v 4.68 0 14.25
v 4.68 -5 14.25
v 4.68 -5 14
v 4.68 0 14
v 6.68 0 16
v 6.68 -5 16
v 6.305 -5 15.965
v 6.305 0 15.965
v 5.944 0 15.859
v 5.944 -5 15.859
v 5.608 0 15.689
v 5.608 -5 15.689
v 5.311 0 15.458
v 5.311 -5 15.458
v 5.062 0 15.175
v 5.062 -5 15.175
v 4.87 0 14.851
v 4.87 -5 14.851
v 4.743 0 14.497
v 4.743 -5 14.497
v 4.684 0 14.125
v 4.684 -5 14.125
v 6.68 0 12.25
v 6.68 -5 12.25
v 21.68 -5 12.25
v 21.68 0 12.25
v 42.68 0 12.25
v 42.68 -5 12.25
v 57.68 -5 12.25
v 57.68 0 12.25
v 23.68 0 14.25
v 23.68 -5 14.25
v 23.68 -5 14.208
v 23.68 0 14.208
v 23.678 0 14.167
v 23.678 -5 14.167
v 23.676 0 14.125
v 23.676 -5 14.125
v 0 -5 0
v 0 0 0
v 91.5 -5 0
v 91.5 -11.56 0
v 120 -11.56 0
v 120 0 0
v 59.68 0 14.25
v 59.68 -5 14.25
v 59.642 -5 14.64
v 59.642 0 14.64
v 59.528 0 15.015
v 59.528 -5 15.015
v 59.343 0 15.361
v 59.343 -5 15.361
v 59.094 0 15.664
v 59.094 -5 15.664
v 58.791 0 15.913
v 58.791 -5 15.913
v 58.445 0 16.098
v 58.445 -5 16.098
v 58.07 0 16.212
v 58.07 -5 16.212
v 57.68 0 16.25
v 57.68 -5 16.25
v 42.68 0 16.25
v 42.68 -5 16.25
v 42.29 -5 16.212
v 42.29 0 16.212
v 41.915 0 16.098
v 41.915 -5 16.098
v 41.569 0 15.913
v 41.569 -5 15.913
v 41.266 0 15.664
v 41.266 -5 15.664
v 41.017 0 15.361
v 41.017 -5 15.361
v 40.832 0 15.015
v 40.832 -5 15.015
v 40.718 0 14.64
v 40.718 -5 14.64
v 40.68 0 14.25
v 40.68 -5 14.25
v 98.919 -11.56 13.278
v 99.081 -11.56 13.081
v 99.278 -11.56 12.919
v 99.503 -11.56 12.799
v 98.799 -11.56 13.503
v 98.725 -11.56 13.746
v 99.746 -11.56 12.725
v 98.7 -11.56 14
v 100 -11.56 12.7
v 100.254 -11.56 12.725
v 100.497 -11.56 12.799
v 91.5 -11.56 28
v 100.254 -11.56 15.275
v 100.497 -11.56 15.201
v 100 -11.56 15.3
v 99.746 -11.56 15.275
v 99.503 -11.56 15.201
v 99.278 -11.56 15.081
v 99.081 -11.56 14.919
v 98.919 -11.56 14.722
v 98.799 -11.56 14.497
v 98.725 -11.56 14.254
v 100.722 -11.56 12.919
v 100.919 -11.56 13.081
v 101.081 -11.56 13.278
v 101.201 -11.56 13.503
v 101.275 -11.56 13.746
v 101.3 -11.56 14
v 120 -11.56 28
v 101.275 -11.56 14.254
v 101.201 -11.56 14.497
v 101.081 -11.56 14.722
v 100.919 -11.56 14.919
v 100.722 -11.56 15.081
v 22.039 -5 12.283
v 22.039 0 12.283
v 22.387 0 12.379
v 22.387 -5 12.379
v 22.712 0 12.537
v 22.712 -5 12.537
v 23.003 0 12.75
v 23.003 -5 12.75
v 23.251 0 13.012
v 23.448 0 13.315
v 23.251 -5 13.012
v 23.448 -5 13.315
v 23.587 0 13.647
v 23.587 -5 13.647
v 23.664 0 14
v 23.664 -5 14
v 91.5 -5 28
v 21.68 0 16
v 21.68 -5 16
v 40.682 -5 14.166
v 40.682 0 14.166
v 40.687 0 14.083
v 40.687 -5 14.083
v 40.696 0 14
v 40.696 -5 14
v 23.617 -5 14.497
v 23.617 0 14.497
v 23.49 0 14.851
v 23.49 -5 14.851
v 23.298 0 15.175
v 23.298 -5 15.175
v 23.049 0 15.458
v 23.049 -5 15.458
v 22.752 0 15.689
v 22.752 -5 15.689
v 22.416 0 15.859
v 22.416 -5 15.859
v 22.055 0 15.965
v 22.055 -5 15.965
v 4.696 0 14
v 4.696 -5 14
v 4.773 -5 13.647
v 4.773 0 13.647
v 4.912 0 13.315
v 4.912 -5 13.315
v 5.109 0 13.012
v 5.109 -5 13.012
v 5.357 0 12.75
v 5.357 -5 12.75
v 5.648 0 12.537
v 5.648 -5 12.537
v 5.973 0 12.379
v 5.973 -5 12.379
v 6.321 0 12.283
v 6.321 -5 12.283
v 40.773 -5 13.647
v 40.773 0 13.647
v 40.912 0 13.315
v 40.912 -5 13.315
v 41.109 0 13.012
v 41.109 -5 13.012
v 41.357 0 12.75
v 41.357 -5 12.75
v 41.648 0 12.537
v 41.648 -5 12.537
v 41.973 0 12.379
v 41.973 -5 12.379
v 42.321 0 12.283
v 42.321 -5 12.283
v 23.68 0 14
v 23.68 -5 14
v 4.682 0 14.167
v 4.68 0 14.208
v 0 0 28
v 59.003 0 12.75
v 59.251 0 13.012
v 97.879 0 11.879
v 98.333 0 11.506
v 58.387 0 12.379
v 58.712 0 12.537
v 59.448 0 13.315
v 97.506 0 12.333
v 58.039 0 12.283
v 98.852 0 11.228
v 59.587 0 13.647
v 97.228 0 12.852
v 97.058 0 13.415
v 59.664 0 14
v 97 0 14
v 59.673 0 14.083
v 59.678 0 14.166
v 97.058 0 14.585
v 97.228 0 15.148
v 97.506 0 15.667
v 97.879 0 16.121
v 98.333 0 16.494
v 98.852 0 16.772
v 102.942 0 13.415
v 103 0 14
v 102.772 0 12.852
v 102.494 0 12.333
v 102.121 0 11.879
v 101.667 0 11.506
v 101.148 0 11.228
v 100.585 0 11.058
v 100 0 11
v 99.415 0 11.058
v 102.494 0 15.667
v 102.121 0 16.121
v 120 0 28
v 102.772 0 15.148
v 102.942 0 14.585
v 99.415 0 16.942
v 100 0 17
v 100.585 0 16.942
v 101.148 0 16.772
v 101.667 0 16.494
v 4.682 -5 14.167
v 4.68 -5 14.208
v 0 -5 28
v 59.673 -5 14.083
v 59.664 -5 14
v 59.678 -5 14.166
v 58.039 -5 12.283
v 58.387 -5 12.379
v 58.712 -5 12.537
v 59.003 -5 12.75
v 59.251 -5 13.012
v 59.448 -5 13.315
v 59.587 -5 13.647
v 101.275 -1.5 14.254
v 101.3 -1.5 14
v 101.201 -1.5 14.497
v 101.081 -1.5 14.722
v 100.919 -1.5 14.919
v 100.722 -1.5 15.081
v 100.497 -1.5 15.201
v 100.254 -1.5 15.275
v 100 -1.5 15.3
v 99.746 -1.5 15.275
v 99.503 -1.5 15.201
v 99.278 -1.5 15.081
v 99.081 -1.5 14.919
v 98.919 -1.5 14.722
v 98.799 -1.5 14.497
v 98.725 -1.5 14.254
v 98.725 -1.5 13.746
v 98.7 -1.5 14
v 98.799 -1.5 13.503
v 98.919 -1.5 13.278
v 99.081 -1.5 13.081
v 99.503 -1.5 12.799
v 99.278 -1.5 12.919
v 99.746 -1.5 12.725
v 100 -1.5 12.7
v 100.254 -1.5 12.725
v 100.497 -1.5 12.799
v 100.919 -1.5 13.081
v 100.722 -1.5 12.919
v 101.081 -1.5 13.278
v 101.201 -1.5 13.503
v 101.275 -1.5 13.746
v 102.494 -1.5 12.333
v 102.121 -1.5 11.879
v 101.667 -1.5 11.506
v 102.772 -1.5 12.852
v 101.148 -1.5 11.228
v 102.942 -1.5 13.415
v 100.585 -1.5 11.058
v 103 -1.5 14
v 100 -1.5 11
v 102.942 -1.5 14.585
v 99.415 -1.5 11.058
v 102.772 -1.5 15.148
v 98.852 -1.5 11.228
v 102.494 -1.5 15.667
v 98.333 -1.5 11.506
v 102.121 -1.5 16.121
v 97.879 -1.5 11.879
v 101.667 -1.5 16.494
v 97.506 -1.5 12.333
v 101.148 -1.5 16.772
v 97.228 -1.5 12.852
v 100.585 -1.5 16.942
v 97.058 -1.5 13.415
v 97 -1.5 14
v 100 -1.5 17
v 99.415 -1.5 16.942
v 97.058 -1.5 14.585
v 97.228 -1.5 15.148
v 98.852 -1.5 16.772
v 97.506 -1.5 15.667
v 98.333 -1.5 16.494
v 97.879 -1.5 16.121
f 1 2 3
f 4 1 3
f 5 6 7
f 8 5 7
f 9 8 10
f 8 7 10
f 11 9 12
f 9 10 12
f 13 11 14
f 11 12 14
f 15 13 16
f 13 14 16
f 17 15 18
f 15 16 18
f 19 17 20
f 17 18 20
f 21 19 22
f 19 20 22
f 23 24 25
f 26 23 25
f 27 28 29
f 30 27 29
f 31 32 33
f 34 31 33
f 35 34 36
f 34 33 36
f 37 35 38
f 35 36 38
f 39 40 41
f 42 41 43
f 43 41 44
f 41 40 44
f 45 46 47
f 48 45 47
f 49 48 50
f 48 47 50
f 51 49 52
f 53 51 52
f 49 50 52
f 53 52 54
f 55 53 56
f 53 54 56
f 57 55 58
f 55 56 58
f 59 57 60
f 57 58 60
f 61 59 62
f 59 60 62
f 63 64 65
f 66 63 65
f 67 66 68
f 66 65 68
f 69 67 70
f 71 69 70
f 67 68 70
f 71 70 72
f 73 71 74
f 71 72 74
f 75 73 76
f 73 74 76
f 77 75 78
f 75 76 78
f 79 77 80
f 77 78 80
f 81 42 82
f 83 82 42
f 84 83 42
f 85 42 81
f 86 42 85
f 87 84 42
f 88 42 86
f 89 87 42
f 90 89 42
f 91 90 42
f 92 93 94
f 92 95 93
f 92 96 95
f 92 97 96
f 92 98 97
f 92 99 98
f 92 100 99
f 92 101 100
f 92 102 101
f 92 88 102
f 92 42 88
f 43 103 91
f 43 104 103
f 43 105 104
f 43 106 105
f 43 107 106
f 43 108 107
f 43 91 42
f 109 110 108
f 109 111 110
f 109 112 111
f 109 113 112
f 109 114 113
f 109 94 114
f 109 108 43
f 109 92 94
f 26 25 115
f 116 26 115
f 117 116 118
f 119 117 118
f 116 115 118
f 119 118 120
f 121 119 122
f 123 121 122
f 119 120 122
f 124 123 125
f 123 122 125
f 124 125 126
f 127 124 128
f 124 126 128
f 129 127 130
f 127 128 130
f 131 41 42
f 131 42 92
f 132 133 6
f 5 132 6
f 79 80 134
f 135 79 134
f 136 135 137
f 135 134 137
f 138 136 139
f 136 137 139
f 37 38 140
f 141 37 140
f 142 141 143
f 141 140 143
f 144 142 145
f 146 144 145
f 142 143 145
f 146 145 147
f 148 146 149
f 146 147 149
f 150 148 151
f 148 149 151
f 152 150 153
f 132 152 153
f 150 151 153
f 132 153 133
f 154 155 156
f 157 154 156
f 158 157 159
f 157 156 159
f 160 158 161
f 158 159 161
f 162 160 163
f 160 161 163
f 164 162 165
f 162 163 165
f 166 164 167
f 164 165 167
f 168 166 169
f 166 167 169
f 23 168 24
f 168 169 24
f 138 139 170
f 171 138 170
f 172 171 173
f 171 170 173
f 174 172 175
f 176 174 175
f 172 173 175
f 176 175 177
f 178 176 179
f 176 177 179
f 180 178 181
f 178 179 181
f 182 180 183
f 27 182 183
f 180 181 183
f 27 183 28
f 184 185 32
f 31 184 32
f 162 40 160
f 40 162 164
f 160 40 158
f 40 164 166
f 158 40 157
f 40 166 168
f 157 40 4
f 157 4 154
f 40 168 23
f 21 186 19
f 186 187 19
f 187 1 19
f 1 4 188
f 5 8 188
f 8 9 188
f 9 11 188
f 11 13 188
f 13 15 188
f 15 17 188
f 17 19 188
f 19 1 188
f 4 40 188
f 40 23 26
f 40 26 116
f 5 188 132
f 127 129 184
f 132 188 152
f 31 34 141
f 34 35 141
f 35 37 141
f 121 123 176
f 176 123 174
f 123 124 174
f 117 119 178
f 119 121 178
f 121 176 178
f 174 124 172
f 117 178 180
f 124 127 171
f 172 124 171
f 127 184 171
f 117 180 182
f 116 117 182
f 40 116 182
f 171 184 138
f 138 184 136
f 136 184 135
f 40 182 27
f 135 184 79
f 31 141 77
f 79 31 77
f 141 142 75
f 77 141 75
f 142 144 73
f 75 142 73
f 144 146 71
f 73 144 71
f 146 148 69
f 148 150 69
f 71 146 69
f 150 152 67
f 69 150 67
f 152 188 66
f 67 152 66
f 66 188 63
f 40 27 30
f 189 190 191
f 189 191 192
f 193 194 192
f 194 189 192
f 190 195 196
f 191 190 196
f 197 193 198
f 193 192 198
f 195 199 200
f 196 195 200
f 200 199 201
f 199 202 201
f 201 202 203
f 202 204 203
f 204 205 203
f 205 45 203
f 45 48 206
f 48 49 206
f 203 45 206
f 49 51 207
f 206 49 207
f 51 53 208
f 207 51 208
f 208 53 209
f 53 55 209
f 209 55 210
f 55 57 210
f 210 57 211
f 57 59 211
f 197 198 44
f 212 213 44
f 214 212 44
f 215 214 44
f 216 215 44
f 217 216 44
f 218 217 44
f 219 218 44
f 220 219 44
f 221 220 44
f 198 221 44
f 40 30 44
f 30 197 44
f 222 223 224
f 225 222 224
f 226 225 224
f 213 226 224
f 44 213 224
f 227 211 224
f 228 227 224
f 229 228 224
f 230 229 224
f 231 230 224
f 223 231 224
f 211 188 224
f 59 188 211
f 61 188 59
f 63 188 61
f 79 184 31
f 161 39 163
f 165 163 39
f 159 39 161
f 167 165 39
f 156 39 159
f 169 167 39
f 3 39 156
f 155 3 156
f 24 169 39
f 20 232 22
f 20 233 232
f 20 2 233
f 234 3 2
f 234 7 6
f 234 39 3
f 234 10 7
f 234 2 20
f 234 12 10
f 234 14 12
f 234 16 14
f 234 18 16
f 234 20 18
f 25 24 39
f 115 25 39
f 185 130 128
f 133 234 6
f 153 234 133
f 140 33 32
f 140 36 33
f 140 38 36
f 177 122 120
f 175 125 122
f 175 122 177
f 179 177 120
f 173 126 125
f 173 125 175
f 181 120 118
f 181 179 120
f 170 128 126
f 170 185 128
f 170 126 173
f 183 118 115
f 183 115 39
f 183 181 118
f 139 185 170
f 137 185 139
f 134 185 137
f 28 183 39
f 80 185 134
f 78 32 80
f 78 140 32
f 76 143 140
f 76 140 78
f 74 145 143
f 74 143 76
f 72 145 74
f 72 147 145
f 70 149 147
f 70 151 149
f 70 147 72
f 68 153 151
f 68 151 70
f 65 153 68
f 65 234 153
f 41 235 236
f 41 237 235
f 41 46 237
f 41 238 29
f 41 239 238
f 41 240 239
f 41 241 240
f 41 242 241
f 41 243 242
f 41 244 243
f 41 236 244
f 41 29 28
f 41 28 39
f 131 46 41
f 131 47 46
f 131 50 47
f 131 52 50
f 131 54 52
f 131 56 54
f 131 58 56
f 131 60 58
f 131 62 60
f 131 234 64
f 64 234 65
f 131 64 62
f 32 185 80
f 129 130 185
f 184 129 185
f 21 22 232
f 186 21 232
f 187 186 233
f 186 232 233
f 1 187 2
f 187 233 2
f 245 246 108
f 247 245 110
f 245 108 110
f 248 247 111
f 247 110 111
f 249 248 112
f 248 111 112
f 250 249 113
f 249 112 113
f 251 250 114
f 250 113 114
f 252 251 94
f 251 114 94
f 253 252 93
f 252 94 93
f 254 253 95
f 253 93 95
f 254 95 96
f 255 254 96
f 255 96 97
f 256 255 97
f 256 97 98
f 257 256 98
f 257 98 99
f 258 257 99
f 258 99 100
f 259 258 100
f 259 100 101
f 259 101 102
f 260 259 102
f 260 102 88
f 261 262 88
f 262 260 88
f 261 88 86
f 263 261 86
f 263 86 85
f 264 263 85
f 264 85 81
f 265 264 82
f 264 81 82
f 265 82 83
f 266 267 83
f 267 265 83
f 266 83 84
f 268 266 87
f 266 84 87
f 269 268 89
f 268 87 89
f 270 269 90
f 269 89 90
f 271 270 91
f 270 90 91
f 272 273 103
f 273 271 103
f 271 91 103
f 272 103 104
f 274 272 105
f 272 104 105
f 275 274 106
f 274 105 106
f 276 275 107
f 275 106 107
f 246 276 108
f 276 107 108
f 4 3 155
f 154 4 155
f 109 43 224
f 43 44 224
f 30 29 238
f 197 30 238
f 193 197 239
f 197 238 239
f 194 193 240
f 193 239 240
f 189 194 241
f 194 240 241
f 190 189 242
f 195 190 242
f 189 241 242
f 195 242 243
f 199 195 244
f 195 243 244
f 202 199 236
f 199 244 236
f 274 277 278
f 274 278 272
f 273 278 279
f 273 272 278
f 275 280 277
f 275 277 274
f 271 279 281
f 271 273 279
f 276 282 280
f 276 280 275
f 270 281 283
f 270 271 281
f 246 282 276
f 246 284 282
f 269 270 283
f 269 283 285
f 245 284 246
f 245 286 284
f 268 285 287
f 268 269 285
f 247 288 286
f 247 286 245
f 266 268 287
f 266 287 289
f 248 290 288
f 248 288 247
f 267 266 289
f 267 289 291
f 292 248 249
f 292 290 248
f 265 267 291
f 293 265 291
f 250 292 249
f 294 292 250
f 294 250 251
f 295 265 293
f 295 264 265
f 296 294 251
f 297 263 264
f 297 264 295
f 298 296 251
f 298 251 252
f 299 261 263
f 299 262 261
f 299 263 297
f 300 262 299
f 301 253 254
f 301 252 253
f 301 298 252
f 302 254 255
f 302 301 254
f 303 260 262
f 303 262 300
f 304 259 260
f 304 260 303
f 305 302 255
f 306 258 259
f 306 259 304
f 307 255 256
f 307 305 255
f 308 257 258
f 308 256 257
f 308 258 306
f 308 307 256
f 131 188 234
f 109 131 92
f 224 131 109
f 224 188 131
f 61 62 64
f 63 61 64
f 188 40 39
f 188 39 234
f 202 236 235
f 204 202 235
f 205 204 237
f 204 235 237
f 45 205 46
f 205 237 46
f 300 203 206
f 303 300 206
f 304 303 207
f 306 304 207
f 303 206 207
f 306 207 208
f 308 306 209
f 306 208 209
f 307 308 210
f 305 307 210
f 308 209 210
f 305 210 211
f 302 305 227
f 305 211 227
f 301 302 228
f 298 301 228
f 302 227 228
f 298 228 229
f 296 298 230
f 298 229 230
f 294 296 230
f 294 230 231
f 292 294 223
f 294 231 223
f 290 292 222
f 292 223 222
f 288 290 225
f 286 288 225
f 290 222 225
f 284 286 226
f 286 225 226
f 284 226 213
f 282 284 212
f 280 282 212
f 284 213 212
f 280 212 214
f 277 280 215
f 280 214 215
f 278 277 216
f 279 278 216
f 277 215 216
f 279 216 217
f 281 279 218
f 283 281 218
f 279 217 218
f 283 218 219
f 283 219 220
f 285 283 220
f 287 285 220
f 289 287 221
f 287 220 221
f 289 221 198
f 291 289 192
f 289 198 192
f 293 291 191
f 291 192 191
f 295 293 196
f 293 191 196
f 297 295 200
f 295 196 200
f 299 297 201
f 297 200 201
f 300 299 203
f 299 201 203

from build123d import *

# Parameters (mm, degrees)
F0_W     = 120
F0_H     = 28
F1_DEPTH = 5
F2_W     = 28.5
F2_H     = 28
F3_DEPTH = 6.56
F5_R     = 1.3
F6_DEPTH = 11.56
F7_DEPTH = 5
F8_R     = 3
F8_R_2   = 1.3
F9_DEPTH = 1.5


with BuildPart() as f1:
    # F0 (on Front) → F1 (new body)
    with BuildSketch(Plane.XZ):
        with Locations((60, 14)):
            Rectangle(F0_W, F0_H)
    extrude(amount=F1_DEPTH)

    # F2 (on face) → F3 (join)
    with BuildSketch(Plane.XZ.offset(5)):
        with Locations((105.75, 14)):
            Rectangle(F2_W, F2_H)
    extrude(amount=F3_DEPTH)

    # F5 (on face) → F6 (cut, through all)
    with BuildSketch(Plane.XZ.offset(11.56)):
        with Locations((100, 14)):
            Circle(F5_R)
    extrude(amount=-F6_DEPTH, mode=Mode.SUBTRACT)

    # F4 (on face) → F7 (cut, through all)
    with BuildSketch(Plane.XZ.offset(5)):
        with BuildLine():
            ThreePointArc((4.68391, 14.125), (4.680978, 14.062531), (4.68, 14))
            Line((4.68, 14), (4.695687, 14))
            ThreePointArc((4.695687, 14), (4.688817, 14.062408), (4.68391, 14.125))
        make_face()
        with BuildLine():
            ThreePointArc((40.68, 14.25), (40.683925, 14.124754), (40.695687, 14))
            Line((40.695687, 14), (59.664313, 14))
            ThreePointArc((59.664313, 14), (59.676075, 14.124754), (59.68, 14.25))
            ThreePointArc((59.68, 14.25), (59.094214, 15.664214), (57.68, 16.25))
            Line((57.68, 16.25), (42.68, 16.25))
            ThreePointArc((42.68, 16.25), (41.265786, 15.664214), (40.68, 14.25))
        make_face()
        with BuildLine():
            Line((59.664313, 14), (40.695687, 14))
            ThreePointArc((40.695687, 14), (41.357124, 12.75), (42.68, 12.25))
            Line((42.68, 12.25), (57.68, 12.25))
            ThreePointArc((57.68, 12.25), (59.002876, 12.75), (59.664313, 14))
        make_face()
        with BuildLine():
            Line((4.68, 14.25), (4.68, 14))
            ThreePointArc((4.68, 14), (4.680978, 14.062531), (4.68391, 14.125))
            ThreePointArc((4.68391, 14.125), (4.680978, 14.187469), (4.68, 14.25))
        make_face()
        with BuildLine():
            ThreePointArc((4.68391, 14.125), (4.688817, 14.062408), (4.695687, 14))
            Line((4.695687, 14), (23.664313, 14))
            ThreePointArc((23.664313, 14), (23.671183, 14.062408), (23.67609, 14.125))
            ThreePointArc((23.67609, 14.125), (23.049306, 15.457738), (21.68, 16))
            Line((21.68, 16), (6.68, 16))
            ThreePointArc((6.68, 16), (5.310694, 15.457738), (4.68391, 14.125))
        make_face()
        with BuildLine():
            Line((23.664313, 14), (4.695687, 14))
            ThreePointArc((4.695687, 14), (5.357124, 12.75), (6.68, 12.25))
            Line((6.68, 12.25), (21.68, 12.25))
            ThreePointArc((21.68, 12.25), (23.002876, 12.75), (23.664313, 14))
        make_face()
        with BuildLine():
            ThreePointArc((23.67609, 14.125), (23.671183, 14.062408), (23.664313, 14))
            Line((23.664313, 14), (23.68, 14))
            ThreePointArc((23.68, 14), (23.679022, 14.062531), (23.67609, 14.125))
        make_face()
        with BuildLine():
            ThreePointArc((23.67609, 14.125), (23.679022, 14.062531), (23.68, 14))
            Line((23.68, 14), (23.68, 14.25))
            ThreePointArc((23.68, 14.25), (23.679022, 14.187469), (23.67609, 14.125))
        make_face()
    extrude(amount=-F7_DEPTH, mode=Mode.SUBTRACT)

    # F8 (on face) → F9 (cut)
    with BuildSketch(Plane(origin=(0, 0, 0), x_dir=(-1, 0, 0), z_dir=(0, 1, 0))):
        with Locations((-100, 14)):
            Circle(F8_R)
        with Locations((-100, 14)):
            Circle(F8_R_2, mode=Mode.SUBTRACT)
    extrude(amount=-F9_DEPTH, mode=Mode.SUBTRACT)


solid = f1.part
